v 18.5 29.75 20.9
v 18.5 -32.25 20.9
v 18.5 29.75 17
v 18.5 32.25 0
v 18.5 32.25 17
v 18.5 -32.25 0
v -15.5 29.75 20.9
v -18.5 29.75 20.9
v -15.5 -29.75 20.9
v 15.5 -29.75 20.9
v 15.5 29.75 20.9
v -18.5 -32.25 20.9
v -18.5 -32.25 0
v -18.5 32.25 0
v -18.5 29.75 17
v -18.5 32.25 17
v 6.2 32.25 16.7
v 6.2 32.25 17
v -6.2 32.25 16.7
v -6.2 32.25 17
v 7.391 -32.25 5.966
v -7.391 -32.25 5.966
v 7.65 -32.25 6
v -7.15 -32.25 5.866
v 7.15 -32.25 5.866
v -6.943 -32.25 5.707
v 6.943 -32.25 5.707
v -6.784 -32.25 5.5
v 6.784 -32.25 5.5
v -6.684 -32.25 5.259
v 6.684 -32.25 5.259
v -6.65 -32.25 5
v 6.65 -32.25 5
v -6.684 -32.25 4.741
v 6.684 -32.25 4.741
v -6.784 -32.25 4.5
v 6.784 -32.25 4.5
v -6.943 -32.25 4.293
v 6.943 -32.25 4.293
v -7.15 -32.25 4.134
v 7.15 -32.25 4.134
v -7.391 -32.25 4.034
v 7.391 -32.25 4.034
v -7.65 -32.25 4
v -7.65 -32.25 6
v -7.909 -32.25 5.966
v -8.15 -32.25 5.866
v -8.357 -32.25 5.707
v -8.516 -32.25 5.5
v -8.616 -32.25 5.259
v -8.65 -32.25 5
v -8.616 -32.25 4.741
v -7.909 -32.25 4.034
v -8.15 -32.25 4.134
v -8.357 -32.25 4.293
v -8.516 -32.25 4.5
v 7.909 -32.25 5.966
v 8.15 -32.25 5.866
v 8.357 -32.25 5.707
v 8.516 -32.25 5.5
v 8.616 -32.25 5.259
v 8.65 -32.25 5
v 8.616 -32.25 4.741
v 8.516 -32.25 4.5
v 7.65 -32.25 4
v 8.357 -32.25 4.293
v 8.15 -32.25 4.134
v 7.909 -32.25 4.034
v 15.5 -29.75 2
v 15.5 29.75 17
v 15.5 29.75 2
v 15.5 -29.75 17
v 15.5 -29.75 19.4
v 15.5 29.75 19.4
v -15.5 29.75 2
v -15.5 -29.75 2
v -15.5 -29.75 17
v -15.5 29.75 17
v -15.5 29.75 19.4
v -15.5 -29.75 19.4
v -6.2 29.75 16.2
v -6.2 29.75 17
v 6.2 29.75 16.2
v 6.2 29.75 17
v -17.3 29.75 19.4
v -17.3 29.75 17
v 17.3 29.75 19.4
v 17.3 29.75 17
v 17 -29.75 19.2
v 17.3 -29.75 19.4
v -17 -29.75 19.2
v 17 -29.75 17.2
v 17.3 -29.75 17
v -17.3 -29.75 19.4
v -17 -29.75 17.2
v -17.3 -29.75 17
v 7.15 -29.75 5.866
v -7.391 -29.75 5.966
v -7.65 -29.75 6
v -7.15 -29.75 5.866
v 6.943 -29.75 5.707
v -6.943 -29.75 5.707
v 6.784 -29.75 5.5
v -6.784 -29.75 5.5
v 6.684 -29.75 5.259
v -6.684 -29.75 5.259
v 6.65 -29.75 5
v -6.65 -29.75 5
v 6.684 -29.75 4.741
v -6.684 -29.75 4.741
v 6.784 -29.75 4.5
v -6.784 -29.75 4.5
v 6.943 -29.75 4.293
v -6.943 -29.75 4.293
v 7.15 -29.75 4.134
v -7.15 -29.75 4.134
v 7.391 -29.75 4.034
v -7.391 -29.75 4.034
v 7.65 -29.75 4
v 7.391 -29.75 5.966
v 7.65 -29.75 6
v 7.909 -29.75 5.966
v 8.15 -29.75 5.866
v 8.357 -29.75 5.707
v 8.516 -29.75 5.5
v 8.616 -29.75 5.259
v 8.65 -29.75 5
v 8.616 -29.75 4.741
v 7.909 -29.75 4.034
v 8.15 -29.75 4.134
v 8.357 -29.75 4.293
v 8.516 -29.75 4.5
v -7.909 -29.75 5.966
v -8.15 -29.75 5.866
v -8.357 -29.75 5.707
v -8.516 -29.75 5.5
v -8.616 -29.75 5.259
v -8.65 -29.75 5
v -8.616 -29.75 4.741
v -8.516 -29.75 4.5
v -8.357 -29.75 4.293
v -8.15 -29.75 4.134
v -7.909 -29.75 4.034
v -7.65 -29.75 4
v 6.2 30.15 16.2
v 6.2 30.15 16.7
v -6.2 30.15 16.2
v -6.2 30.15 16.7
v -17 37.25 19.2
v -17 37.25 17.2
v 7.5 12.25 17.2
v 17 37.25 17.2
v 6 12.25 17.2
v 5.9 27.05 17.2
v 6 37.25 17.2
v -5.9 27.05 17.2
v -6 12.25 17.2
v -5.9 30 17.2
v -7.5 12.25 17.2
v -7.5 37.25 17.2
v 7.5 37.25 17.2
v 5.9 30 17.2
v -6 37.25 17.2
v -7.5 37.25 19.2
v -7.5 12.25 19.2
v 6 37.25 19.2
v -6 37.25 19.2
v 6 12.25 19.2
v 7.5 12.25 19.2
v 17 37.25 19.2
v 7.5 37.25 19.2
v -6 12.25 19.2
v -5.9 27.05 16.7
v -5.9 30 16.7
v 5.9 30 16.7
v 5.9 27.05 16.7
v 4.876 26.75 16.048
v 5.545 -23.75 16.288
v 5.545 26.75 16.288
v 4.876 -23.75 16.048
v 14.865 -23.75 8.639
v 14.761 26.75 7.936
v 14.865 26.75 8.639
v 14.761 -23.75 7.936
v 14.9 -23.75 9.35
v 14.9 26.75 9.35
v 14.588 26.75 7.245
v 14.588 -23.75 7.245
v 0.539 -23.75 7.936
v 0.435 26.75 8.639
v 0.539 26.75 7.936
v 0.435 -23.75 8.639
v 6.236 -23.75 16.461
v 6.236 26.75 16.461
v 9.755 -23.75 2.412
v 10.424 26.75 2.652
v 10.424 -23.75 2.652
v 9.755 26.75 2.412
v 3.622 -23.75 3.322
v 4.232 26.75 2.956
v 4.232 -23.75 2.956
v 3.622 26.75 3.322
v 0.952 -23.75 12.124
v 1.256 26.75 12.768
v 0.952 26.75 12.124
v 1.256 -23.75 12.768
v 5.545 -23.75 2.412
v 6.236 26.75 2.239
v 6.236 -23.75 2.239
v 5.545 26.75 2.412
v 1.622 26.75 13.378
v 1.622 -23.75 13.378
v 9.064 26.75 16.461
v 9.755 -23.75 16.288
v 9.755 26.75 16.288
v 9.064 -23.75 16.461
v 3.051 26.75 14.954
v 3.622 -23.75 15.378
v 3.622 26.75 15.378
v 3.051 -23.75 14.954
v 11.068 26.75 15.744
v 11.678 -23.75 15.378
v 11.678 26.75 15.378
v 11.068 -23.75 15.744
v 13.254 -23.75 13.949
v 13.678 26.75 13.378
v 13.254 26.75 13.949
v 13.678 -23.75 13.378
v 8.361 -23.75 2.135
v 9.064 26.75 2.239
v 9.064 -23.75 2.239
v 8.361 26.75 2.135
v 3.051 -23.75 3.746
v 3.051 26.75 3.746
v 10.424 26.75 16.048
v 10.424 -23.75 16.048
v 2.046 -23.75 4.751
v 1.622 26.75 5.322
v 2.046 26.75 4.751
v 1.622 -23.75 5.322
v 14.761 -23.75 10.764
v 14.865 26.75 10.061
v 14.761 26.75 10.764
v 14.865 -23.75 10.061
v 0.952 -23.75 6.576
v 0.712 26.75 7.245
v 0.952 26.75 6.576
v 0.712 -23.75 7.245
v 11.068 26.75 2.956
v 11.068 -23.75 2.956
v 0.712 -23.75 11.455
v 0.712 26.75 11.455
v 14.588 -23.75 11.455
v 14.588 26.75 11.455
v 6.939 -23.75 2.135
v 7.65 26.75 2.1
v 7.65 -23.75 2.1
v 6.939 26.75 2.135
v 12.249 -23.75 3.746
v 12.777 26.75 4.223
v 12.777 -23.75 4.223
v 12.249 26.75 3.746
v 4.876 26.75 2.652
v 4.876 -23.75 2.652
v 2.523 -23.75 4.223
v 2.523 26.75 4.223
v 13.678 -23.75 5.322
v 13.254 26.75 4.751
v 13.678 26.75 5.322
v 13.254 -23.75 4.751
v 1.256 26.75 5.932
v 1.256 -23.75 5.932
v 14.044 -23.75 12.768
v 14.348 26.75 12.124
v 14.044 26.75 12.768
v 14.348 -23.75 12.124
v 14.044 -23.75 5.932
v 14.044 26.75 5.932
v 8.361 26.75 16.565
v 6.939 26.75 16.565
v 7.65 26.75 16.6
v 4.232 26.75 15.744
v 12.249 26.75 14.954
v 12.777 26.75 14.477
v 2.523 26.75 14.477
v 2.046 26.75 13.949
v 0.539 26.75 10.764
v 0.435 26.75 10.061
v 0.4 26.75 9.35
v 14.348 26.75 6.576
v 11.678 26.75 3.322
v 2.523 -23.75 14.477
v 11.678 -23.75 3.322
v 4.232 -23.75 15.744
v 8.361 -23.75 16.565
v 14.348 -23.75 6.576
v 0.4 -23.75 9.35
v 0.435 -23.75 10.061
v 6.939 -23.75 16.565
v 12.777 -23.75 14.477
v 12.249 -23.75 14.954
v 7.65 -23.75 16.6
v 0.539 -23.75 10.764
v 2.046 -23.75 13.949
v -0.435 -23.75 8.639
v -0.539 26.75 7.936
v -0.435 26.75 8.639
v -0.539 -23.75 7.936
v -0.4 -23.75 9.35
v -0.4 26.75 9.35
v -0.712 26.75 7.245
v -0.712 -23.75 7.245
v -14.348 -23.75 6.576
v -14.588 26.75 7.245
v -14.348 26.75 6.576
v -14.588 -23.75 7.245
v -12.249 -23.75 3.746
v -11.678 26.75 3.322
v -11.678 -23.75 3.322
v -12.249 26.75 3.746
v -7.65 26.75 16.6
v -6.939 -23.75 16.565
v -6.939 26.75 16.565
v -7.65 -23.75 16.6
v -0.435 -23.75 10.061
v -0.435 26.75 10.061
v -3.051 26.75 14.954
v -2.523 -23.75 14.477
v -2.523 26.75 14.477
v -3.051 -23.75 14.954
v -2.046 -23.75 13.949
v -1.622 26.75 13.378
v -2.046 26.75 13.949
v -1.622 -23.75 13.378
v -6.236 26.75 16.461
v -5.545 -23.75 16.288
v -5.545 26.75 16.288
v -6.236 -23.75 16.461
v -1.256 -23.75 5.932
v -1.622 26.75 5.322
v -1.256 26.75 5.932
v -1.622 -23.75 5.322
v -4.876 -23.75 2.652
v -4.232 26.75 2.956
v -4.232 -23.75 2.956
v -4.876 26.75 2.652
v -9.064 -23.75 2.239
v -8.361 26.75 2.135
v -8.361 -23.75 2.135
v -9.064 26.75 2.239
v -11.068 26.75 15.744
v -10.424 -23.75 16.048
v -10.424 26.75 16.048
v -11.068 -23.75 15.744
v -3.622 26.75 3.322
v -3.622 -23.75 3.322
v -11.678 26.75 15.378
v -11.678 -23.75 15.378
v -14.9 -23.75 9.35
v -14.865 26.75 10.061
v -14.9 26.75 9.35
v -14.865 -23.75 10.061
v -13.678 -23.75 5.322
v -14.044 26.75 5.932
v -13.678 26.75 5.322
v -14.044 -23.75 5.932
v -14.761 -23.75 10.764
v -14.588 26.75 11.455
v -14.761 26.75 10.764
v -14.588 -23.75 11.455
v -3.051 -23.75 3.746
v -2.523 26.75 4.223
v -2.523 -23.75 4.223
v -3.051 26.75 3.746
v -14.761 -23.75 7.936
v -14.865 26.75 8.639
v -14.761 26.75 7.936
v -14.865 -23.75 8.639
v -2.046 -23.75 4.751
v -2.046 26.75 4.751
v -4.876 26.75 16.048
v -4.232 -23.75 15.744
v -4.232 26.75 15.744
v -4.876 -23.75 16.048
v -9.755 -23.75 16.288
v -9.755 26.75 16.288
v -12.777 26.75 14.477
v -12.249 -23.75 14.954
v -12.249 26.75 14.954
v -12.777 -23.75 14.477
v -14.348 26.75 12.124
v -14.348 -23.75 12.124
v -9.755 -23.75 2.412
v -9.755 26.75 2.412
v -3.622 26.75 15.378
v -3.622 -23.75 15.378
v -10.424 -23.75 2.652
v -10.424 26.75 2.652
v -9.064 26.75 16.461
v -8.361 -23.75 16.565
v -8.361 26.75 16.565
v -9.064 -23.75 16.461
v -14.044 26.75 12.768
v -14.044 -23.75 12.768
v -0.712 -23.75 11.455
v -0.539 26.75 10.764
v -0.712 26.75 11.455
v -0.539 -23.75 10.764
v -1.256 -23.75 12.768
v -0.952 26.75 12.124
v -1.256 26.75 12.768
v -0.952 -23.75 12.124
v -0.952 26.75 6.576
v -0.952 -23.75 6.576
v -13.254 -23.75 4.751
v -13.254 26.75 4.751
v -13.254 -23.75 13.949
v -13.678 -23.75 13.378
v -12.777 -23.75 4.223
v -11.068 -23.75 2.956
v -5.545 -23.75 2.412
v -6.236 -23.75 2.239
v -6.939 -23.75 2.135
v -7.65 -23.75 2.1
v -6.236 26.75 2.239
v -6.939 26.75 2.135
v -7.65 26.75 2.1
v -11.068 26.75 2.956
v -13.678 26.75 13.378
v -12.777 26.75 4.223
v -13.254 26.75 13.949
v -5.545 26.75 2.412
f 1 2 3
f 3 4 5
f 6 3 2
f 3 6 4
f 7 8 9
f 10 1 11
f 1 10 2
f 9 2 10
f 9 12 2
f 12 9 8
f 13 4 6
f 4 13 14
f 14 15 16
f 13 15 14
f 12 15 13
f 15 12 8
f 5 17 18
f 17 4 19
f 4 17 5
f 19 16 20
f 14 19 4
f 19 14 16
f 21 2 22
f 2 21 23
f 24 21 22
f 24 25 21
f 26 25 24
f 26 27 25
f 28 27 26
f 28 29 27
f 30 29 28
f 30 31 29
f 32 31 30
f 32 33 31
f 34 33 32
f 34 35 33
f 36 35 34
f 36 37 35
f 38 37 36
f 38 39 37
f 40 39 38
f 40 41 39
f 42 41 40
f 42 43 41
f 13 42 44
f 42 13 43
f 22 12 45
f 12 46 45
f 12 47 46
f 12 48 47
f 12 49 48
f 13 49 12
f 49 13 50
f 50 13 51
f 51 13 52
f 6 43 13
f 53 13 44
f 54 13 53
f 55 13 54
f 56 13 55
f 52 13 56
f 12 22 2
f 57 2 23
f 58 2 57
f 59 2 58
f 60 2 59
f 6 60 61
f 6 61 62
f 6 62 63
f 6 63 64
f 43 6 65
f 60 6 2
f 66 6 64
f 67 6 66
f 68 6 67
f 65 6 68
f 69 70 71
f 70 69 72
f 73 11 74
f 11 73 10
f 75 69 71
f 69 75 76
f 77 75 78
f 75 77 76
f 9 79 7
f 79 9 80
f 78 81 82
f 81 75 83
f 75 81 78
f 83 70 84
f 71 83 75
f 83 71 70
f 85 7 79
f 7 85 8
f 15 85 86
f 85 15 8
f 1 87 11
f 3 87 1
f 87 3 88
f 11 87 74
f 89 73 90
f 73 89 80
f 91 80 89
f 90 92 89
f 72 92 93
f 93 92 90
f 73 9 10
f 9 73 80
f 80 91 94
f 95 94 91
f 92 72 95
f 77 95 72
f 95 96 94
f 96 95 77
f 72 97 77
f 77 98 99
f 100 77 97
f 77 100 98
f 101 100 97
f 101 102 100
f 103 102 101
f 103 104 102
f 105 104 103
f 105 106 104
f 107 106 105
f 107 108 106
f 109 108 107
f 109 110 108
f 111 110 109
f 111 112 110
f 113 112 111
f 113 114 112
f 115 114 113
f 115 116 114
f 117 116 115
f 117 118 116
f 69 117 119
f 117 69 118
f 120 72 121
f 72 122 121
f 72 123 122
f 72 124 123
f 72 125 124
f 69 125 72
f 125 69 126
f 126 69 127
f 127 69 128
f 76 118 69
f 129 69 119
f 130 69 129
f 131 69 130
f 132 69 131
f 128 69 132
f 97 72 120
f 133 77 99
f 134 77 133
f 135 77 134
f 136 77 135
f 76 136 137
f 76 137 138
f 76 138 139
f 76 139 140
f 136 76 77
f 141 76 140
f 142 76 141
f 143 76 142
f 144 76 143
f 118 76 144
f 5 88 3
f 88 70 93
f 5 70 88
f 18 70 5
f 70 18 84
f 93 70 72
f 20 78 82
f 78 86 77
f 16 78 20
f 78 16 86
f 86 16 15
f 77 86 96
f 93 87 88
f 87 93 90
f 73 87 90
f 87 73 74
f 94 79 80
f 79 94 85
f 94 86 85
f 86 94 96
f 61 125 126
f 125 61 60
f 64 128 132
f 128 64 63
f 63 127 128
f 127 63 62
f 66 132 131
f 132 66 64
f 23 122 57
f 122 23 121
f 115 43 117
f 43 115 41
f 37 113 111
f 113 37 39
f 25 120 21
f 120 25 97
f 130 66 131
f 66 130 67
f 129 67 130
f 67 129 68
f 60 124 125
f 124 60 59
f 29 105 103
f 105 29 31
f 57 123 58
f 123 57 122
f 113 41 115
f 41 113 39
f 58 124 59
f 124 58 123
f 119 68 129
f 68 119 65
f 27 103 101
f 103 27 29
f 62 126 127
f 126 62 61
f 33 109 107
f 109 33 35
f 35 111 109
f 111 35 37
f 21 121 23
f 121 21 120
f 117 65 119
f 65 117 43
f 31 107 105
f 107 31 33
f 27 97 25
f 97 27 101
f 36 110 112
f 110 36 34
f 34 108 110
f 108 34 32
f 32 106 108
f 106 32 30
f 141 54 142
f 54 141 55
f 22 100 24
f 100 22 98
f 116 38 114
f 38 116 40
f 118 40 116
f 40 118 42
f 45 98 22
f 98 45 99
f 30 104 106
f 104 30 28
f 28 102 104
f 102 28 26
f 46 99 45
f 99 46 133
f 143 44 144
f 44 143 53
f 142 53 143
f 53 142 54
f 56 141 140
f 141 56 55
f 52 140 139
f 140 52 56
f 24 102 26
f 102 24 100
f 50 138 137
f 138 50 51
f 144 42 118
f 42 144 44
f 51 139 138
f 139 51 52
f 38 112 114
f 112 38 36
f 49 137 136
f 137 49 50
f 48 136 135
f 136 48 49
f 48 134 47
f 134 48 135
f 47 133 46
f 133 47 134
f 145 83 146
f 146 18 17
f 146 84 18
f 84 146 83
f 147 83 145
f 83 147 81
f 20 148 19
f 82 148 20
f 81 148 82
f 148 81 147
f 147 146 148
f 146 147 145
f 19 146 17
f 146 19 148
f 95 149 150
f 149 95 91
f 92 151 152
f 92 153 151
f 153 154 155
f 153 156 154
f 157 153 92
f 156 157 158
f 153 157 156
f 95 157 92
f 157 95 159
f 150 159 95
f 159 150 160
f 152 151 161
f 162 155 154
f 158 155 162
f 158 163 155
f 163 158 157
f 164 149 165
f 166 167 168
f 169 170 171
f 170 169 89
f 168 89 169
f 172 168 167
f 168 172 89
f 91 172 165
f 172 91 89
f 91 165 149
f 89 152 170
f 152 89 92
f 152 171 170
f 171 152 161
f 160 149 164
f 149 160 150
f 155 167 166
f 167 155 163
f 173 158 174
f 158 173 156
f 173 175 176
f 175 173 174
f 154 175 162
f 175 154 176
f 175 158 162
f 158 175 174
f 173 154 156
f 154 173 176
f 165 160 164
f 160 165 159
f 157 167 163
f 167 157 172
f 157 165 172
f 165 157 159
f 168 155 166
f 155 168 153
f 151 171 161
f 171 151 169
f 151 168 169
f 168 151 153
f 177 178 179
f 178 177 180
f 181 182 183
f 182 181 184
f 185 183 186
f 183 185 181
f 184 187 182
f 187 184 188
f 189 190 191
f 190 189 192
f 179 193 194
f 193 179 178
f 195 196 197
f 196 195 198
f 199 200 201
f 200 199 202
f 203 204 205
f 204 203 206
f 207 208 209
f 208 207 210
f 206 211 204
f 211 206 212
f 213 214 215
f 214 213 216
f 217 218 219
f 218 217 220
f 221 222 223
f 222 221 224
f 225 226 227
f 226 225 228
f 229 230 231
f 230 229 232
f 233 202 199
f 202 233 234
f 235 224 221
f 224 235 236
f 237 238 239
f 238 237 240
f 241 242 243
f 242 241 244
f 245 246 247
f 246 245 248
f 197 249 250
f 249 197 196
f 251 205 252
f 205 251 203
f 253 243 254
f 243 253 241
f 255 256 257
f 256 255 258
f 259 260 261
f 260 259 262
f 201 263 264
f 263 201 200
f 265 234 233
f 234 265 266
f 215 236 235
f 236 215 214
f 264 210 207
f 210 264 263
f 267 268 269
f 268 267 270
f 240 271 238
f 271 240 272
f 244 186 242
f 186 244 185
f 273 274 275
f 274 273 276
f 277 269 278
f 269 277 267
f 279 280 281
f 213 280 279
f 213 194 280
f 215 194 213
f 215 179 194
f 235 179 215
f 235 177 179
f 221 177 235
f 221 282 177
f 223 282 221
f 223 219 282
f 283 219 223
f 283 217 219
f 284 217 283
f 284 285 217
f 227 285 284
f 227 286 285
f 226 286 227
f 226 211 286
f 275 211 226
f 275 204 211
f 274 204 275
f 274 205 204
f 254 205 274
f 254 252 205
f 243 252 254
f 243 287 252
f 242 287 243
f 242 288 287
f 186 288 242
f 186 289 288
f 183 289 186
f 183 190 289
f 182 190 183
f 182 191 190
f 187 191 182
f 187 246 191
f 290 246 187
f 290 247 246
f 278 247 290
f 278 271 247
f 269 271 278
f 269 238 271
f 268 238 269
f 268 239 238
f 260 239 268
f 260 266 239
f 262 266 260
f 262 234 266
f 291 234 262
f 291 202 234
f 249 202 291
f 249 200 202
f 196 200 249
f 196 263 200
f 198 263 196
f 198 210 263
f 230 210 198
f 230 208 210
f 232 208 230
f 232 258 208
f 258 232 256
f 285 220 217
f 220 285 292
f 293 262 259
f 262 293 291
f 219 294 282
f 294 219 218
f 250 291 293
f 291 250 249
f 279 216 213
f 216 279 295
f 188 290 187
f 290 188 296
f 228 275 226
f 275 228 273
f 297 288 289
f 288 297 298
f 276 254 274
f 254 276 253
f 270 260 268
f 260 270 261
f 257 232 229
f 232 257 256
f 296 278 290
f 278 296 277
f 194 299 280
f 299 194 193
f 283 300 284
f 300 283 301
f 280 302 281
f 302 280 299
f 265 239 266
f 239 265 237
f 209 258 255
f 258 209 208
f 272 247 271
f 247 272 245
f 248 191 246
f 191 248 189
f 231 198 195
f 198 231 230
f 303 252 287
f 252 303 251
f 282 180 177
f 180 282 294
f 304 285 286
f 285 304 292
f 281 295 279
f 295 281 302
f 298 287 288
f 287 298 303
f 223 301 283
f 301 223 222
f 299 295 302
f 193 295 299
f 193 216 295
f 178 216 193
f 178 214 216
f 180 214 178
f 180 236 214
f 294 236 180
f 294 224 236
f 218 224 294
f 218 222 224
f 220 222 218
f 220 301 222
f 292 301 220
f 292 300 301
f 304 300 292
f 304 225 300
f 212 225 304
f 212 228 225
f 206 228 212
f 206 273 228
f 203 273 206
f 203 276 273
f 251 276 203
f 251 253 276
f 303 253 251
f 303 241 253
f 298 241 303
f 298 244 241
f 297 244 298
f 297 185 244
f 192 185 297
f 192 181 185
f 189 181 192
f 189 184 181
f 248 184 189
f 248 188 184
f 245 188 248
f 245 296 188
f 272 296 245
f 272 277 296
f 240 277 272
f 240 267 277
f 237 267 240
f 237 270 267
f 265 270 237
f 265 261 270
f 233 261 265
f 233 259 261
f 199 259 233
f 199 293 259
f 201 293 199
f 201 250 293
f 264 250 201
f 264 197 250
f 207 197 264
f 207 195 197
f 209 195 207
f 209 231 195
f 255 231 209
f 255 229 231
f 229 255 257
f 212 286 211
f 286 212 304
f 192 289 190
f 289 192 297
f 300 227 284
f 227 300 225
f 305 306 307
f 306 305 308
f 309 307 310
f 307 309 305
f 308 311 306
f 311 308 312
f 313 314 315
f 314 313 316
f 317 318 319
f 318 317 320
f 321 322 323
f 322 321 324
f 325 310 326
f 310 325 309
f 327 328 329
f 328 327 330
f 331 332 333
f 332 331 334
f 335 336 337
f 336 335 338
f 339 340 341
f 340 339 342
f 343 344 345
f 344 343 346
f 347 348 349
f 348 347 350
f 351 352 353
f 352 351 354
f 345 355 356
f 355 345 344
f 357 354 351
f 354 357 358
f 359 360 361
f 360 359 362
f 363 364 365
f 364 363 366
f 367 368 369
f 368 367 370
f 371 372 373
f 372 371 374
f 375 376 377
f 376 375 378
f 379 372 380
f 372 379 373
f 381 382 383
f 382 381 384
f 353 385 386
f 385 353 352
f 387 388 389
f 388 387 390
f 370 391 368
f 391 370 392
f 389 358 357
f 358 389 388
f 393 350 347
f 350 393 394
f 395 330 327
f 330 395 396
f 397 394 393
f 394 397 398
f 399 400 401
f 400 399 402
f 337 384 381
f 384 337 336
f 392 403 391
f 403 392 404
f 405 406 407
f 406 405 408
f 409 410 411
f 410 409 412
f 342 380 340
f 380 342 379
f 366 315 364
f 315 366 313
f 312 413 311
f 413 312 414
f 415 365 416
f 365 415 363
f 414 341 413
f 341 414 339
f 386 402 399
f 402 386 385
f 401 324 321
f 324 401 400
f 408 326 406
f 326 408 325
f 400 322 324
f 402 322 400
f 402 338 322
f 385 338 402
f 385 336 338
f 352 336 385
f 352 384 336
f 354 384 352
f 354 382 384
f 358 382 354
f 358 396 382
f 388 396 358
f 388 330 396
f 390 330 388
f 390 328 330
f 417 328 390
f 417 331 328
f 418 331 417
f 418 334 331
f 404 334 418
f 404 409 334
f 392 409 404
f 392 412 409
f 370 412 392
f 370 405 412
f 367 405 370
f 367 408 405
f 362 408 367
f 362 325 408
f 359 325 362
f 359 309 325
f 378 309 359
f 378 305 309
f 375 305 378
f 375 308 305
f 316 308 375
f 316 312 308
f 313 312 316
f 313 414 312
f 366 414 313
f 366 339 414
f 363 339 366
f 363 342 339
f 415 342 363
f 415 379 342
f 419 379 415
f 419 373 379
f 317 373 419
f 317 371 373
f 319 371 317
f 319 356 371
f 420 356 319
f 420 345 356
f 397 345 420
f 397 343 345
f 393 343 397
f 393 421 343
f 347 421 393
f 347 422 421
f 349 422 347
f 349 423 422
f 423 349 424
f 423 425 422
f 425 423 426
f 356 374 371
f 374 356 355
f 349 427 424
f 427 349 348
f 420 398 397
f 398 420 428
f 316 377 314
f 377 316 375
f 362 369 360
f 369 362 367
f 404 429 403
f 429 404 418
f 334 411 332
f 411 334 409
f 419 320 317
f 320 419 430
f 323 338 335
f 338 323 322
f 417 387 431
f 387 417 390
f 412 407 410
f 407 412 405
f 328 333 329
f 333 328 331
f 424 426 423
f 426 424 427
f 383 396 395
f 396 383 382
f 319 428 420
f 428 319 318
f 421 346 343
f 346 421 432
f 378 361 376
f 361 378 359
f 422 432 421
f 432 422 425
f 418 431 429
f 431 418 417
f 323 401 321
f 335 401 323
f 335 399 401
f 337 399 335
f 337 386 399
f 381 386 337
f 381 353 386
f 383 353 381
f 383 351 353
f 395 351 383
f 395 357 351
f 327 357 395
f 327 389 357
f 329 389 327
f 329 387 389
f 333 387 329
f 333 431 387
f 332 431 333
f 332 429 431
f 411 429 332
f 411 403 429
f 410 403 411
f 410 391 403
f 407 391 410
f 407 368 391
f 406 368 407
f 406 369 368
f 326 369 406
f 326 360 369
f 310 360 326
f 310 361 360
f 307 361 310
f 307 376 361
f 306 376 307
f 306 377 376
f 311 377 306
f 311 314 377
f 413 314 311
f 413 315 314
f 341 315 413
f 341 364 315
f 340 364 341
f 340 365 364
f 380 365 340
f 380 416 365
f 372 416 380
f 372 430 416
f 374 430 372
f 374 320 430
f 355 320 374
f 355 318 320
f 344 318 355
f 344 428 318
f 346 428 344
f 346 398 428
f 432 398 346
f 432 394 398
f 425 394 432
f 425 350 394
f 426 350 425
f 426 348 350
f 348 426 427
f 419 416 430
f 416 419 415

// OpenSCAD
/* Holder for two AA batteries with sliding cover.
   PLA, 0.4mm nozzle, no supports. Units mm.
   Print orientation: +Z up, parts rest on min z.
*/

// ---------- parameters ----------
battery_d = 14.5;
battery_l = 50.5;
side_gap = 0.6;      // battery side to wall
mid_gap = 0.8;       // between batteries
Wi = 2*battery_d + mid_gap + 2*side_gap; // 31.0 interior width
Li = battery_l + 3 + 6;                  // 59.5 interior length
floor_t = 2.0;
side_t = 3.0;
end_t = 2.5;
Wext = Wi + 2*side_t;   // 37
Lext = Li + 2*end_t;    // 64.5
wall_top = 20.9;
low_top = 17.0;
groove_bottom = 17.0;
groove_h = 2.4;
groove_top = groove_bottom + groove_h; // 19.4
groove_depth = 1.8;
engage = 1.5;
Wc = Wi + 2*engage;     // 34 cover width
Lc0 = Lext/2 + Li/2;      // 62 main length (leading edge butts on spring wall)
lip_len = 5.0;
Lc = Lc0 + lip_len;     // 67 total cover length
y0b = -Lext/2;          // -32.25 base min y
y1b = Lext/2;           // 32.25 base max y
y0c = -Li/2;            // -29.75 cover min y (stops at spring wall inner face)
y1c = Lext/2 + lip_len; // 37.25 cover max y
tc = 2.0;
finger_w = 12;
slot_w = 1.5;
finger_y0 = 12.25;
tooth_w = 11.8;
tooth_yl = 2.95;
tooth_y0 = 27.05;
tooth_y1 = tooth_y0 + tooth_yl; // 30.0: rides channel then drops into pocket
tooth_h = 0.5;
chan_hw = 6.2;
pock_y0 = 26.9;
pock_y1 = 30.15;
pock_floor = 16.2;
chan_floor = 16.7;
bx = battery_d/2 + mid_gap/2; // 7.65 battery center x
battery_y0 = -Li/2 + 6;       // -23.75 spring side
battery_y1 = battery_y0 + battery_l; // 26.75
battery_yc = (battery_y0 + battery_y1)/2; // 1.5
battery_zc = floor_t + battery_d/2 + 0.1; // 9.35 slight lift
wire_z = 5;
wire_r = 1.0;

part = "assembly"; // [base, cover, assembly]
cadverify_only = "";
module instance(name, part, unit = 1) {
    echo(cadverify_instance = [name, part, unit]);
    if (cadverify_only == "" || cadverify_only == name) children();
}

module battery() {
    rotate([-90,0,0])
        cylinder(d=battery_d, h=battery_l, center=true, $fn=64);
}

module base() {
    difference() {
        // outer solid
        translate([-Wext/2, y0b, 0])
            cube([Wext, Lext, wall_top]);
        // interior cavity open at top
        translate([-Wi/2, -Li/2, floor_t])
            cube([Wi, Li, wall_top - floor_t + 1]);
        // low end wall cut (+Y end)
        translate([-Wext/2, Li/2, low_top])
            cube([Wext, Lext/2 - Li/2 + 0.5, wall_top - low_top + 1]);
        // left groove
        translate([Wi/2, -Li/2, groove_bottom])
            cube([groove_depth, Li/2 + Lext/2 + 0.5, groove_h]);
        // right groove
        translate([-Wi/2 - groove_depth, -Li/2, groove_bottom])
            cube([groove_depth, Li/2 + Lext/2 + 0.5, groove_h]);
        // wire holes through spring (-Y) wall
        translate([bx, y0b - 1, wire_z])
            rotate([-90,0,0])
                cylinder(r=wire_r, h=end_t + 2, $fn=24);
        translate([-bx, y0b - 1, wire_z])
            rotate([-90,0,0])
                cylinder(r=wire_r, h=end_t + 2, $fn=24);
        // latch pocket (deep) + entry channel (shallow, open at +Y face) in low wall top
        translate([-chan_hw, pock_y0, pock_floor])
            cube([2*chan_hw, pock_y1 - pock_y0, low_top - pock_floor + 0.02]);
        translate([-chan_hw, pock_y1, chan_floor])
            cube([2*chan_hw, y1b - pock_y1 + 0.05, low_top - chan_floor + 0.02]);
    }
}

module cover() {
    // print orientation: plate 0..tc, tooth on top tc..tc+tooth_h
    difference() {
        union() {
            translate([-Wc/2, y0c, 0])
                cube([Wc, Lc, tc]);
            // latch tooth on top (becomes bottom after flip)
            translate([-tooth_w/2, tooth_y0, tc])
                cube([tooth_w, tooth_yl, tooth_h]);
        }
        // finger slots, open at +Y lip end
        translate([finger_w/2, finger_y0, -0.5])
            cube([slot_w, y1c - finger_y0 + 0.5, tc + 1.5]);
        translate([-finger_w/2 - slot_w, finger_y0, -0.5])
            cube([slot_w, y1c - finger_y0 + 0.5, tc + 1.5]);
    }
}

module assembly() {
    instance("base", "base", 1) base();
    instance("battery_left", "external", 1)
        translate([bx, battery_yc, battery_zc]) battery();
    instance("battery_right", "external", 1)
        translate([-bx, battery_yc, battery_zc]) battery();
    // cover printed upside-down: rotate 180 about Y then lift
    instance("cover", "cover", 1)
        translate([0, 0, 19.2]) rotate([0,180,0]) cover();
}

// ---------- specs ----------
if (part == "base") {
    echo(cadverify_spec = [
        ["bounds", [[-Wext/2, y0b, 0], [Wext/2, y1b, wall_top]]],
        ["bodies", 1],
        ["through_holes", 2],
        ["support_faces", [["bottom", "-z", 2000]]],
        ["overhangs_allowed", [
            ["groove ceilings bridge 3.6mm", [[Wi/2 - 0.6, -Li/2 - 0.5, groove_bottom - 0.5], [Wi/2 + groove_depth + 0.5, y1b + 0.2, groove_top + 0.6]]],
            ["groove ceilings bridge 3.6mm", [[-Wi/2 - groove_depth - 0.5, -Li/2 - 0.5, groove_bottom - 0.5], [-Wi/2 + 0.6, y1b + 0.2, groove_top + 0.6]]],
            ["wire holes 2mm dia bridges", [[-10, y0b - 0.5, wire_z - 1.5], [10, -Li/2 + 0.5, wire_z + 1.5]]]
        ]],
        ["copies", 1],
        ["details", [
            ["cavity", "void", [[-Wi/2, -Li/2, floor_t], [Wi/2, Li/2, 17]], 0.9],
            ["spring_room", "void", [[-Wi/2, -Li/2, floor_t], [Wi/2, -Li/2 + 6, 16.6]], 0.9],
            ["pos_room", "void", [[-Wi/2, Li/2 - 3, floor_t], [Wi/2, Li/2, 16.6]], 0.9],
            ["groove_left", "void", [[Wi/2, -Li/2, groove_bottom], [Wi/2 + groove_depth, y1b, groove_top]], 0.85],
            ["groove_right", "void", [[-Wi/2 - groove_depth, -Li/2, groove_bottom], [-Wi/2, y1b, groove_top]], 0.85],
            ["pocket", "void", [[-chan_hw, pock_y0, pock_floor], [chan_hw, pock_y1, low_top + 0.02]], 0.85],
            ["latch_channel", "void", [[-chan_hw, pock_y1, chan_floor], [chan_hw, y1b + 0.05, low_top + 0.02]], 0.85],
            ["latch", "view", [[-chan_hw, pock_y0, pock_floor], [chan_hw, y1b + 0.05, low_top + 0.02]]],
            ["wire1", "hole", [bx, y0b - 1, wire_z], [0, 1, 0], [[0, 2], [2, 2]]],
            ["wire2", "hole", [-bx, y0b - 1, wire_z], [0, 1, 0], [[0, 2], [2, 2]]],
            ["floor", "thickness", [0, 0, -1], [0, 0, 1], 2.0],
            ["side_wall", "thickness", [Wext/2 + 1, 0, 18.2], [-1, 0, 0], 1.2],
            ["end_wall", "thickness", [0, y1b + 1, 10], [0, -1, 0], 2.5]
        ]]
    ]);
    base();
} else if (part == "cover") {
    echo(cadverify_spec = [
        ["bounds", [[-Wc/2, y0c, 0], [Wc/2, y1c, tc + tooth_h]]],
        ["bodies", 1],
        ["through_holes", 0],
        ["support_faces", [["bottom", "-z", 1500]]],
        ["overhangs_allowed", []],
        ["copies", 1],
        ["details", [
            ["plate", "thickness", [0, -10, -1], [0, 0, 1], 2.0],
            ["finger", "material", [[-finger_w/2, finger_y0, 0], [finger_w/2, y1c, tc]], 0.85],
            ["slot_left", "void", [[finger_w/2, finger_y0, -0.5], [finger_w/2 + slot_w, y1c + 0.01, tc + 0.5]], 0.85],
            ["slot_right", "void", [[-finger_w/2 - slot_w, finger_y0, -0.5], [-finger_w/2, y1c + 0.01, tc + 0.5]], 0.85],
            ["tooth", "material", [[-tooth_w/2, tooth_y0, tc], [tooth_w/2, tooth_y1, tc + tooth_h]], 0.85],
            ["catch", "view", [[-tooth_w/2, tooth_y0, tc - 0.01], [tooth_w/2, tooth_y1, tc + tooth_h]]],
            ["lip", "material", [[-Wc/2, y1b, 0], [Wc/2, y1c, tc]], 0.9]
        ]]
    ]);
    cover();
} else if (part == "assembly") {
    echo(cadverify_spec = [
        ["bounds", [[-Wext/2, y0b, 0], [Wext/2, y1c, wall_top]]],
        ["support_faces", [["bottom", "-z", 2000]]],
        ["allowed_interferences", []],
        ["motions", [
            ["slide_cover", ["cover"], "slide", [0, 1, 0], [0, 60], ["flex", [["cover", "base", 1.0, "flexible finger lifts tooth 0.5 over channel step"]]]]
        ]],
        ["assembly_order", [
            [["base"], [0, 0, 0]],
            [["battery_left"], [0, 0, -1]],
            [["battery_right"], [0, 0, -1]],
            [["cover"], [0, -1, 0]]
        ]]
    ]);
    assembly();
}
